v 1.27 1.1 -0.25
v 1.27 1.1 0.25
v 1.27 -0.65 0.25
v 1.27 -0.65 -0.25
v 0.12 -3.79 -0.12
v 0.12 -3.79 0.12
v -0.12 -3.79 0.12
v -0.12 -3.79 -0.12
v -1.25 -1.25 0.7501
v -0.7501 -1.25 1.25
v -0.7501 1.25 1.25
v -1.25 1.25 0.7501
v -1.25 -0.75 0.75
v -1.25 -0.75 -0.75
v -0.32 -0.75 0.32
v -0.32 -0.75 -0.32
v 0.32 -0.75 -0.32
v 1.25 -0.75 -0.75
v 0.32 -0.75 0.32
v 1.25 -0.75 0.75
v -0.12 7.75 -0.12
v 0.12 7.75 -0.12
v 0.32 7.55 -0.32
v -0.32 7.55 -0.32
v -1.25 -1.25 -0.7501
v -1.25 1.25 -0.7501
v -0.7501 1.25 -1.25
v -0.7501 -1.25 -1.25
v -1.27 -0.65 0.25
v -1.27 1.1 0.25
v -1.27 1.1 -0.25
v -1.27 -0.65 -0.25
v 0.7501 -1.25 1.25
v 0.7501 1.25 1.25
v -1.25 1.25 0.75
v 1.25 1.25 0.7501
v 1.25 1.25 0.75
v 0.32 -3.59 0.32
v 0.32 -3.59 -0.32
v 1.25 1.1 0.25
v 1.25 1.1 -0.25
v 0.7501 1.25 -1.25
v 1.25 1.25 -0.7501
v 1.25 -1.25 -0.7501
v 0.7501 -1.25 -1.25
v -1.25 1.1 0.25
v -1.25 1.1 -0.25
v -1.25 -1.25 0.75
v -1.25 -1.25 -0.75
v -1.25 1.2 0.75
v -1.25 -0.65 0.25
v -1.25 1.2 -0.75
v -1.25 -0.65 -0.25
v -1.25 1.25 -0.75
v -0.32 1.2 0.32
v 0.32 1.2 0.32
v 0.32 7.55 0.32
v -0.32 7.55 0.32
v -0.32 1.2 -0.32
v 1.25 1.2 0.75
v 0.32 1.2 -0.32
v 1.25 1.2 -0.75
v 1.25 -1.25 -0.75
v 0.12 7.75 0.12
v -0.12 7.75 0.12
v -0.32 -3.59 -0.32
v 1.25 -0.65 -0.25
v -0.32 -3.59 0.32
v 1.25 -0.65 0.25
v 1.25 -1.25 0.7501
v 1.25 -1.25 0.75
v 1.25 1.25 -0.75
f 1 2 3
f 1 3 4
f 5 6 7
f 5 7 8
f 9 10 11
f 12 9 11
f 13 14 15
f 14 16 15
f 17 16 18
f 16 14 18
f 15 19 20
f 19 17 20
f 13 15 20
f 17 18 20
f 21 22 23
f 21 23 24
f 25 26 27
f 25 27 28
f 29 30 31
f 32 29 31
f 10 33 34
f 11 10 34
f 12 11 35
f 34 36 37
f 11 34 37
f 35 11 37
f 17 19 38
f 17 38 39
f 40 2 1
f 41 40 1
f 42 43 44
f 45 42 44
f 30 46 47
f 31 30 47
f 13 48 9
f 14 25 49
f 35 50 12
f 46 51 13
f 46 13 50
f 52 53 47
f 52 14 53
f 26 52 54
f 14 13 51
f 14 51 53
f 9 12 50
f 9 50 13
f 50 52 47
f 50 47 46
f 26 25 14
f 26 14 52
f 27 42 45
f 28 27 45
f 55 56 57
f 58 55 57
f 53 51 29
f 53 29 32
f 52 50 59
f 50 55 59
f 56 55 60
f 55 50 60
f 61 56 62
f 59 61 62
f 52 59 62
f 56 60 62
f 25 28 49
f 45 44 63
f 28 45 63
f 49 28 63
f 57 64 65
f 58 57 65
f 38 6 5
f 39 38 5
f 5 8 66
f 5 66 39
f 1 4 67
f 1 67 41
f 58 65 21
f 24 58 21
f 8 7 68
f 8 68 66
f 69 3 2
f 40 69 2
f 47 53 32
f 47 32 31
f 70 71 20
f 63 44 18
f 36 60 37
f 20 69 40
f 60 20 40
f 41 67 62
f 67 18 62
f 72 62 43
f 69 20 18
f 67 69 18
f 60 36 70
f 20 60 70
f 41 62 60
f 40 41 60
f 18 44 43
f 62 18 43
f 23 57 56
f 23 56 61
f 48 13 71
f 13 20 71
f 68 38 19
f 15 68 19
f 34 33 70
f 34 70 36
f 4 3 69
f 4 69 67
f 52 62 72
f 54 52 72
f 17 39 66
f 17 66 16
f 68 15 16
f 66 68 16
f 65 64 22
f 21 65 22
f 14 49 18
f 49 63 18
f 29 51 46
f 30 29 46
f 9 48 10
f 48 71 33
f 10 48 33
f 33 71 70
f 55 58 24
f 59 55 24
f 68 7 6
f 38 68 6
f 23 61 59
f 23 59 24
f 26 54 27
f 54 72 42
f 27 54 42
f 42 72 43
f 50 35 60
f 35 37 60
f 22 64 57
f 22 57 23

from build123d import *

# Parameters (mm, degrees)
SKETCH1_W           = 0.64
SKETCH1_H           = 11.54
BOSS_EXTRUDE1_DEPTH = 0.32
BOSS_EXTRUDE3_DEPTH = 1.25
CHAMFER1_SIZE       = 0.5
SKETCH3_W           = 0.5
SKETCH3_H           = 1.75
BOSS_EXTRUDE4_DEPTH = 1.27
CHAMFER2_SIZE       = 0.2


with BuildPart() as part:
    # Sketch1 → Boss-Extrude1 (new, symmetric)
    with BuildSketch(Plane(origin=(0, 0, 0), x_dir=(0, 0, -1), z_dir=(1, 0, 0))):
        with Locations((0, 1.98)):
            Rectangle(SKETCH1_W, SKETCH1_H)
    extrude(amount=BOSS_EXTRUDE1_DEPTH, both=True)

    # Sketch2 → Boss-Extrude3 (add, symmetric)
    with BuildSketch(Plane(origin=(0, 0, 0), x_dir=(0, -1, 0), z_dir=(1, 0, 0))):
        Polygon((-1.25, 1.25), (1.25, 1.25), (1.25, 0.75), (0.75, 0.75), (0.75, -0.75), (1.25, -0.75), (1.25, -1.25), (-1.25, -1.25), (-1.25, -0.75), (-1.2, -0.75), (-1.2, 0.75), (-1.25, 0.75), align=None)
    extrude(amount=BOSS_EXTRUDE3_DEPTH, both=True)

    # Chamfer1
    chamfer1_edges = [part.edges().sort_by_distance(p)[0] for p in [
        (1.25, 0, 1.25),
        (1.25, 0, -1.25),
        (-1.25, 0, 1.25),
        (-1.25, 0, -1.25),
    ]]
    chamfer(chamfer1_edges, length=CHAMFER1_SIZE - 0.0001)  # a hair under: the kernel refuses the full size

    # Sketch3 → Boss-Extrude4 (add, symmetric)
    with BuildSketch(Plane(origin=(0, 0, 0), x_dir=(0, 0, -1), z_dir=(1, 0, 0))):
        with Locations((0, 0.225)):
            Rectangle(SKETCH3_W, SKETCH3_H)
    extrude(amount=BOSS_EXTRUDE4_DEPTH, both=True)

    # Chamfer2
    chamfer2_edges = [part.edges().sort_by_distance(p)[0] for p in [
        (0.32, -3.79, 0),
        (0.32, 7.75, 0),
        (-0.32, -3.79, 0),
        (-0.32, 7.75, 0),
        (0, 7.75, -0.32),
        (0, -3.79, -0.32),
        (0, -3.79, 0.32),
        (0, 7.75, 0.32),
    ]]
    chamfer(chamfer2_edges, length=CHAMFER2_SIZE)


solid = part.part
